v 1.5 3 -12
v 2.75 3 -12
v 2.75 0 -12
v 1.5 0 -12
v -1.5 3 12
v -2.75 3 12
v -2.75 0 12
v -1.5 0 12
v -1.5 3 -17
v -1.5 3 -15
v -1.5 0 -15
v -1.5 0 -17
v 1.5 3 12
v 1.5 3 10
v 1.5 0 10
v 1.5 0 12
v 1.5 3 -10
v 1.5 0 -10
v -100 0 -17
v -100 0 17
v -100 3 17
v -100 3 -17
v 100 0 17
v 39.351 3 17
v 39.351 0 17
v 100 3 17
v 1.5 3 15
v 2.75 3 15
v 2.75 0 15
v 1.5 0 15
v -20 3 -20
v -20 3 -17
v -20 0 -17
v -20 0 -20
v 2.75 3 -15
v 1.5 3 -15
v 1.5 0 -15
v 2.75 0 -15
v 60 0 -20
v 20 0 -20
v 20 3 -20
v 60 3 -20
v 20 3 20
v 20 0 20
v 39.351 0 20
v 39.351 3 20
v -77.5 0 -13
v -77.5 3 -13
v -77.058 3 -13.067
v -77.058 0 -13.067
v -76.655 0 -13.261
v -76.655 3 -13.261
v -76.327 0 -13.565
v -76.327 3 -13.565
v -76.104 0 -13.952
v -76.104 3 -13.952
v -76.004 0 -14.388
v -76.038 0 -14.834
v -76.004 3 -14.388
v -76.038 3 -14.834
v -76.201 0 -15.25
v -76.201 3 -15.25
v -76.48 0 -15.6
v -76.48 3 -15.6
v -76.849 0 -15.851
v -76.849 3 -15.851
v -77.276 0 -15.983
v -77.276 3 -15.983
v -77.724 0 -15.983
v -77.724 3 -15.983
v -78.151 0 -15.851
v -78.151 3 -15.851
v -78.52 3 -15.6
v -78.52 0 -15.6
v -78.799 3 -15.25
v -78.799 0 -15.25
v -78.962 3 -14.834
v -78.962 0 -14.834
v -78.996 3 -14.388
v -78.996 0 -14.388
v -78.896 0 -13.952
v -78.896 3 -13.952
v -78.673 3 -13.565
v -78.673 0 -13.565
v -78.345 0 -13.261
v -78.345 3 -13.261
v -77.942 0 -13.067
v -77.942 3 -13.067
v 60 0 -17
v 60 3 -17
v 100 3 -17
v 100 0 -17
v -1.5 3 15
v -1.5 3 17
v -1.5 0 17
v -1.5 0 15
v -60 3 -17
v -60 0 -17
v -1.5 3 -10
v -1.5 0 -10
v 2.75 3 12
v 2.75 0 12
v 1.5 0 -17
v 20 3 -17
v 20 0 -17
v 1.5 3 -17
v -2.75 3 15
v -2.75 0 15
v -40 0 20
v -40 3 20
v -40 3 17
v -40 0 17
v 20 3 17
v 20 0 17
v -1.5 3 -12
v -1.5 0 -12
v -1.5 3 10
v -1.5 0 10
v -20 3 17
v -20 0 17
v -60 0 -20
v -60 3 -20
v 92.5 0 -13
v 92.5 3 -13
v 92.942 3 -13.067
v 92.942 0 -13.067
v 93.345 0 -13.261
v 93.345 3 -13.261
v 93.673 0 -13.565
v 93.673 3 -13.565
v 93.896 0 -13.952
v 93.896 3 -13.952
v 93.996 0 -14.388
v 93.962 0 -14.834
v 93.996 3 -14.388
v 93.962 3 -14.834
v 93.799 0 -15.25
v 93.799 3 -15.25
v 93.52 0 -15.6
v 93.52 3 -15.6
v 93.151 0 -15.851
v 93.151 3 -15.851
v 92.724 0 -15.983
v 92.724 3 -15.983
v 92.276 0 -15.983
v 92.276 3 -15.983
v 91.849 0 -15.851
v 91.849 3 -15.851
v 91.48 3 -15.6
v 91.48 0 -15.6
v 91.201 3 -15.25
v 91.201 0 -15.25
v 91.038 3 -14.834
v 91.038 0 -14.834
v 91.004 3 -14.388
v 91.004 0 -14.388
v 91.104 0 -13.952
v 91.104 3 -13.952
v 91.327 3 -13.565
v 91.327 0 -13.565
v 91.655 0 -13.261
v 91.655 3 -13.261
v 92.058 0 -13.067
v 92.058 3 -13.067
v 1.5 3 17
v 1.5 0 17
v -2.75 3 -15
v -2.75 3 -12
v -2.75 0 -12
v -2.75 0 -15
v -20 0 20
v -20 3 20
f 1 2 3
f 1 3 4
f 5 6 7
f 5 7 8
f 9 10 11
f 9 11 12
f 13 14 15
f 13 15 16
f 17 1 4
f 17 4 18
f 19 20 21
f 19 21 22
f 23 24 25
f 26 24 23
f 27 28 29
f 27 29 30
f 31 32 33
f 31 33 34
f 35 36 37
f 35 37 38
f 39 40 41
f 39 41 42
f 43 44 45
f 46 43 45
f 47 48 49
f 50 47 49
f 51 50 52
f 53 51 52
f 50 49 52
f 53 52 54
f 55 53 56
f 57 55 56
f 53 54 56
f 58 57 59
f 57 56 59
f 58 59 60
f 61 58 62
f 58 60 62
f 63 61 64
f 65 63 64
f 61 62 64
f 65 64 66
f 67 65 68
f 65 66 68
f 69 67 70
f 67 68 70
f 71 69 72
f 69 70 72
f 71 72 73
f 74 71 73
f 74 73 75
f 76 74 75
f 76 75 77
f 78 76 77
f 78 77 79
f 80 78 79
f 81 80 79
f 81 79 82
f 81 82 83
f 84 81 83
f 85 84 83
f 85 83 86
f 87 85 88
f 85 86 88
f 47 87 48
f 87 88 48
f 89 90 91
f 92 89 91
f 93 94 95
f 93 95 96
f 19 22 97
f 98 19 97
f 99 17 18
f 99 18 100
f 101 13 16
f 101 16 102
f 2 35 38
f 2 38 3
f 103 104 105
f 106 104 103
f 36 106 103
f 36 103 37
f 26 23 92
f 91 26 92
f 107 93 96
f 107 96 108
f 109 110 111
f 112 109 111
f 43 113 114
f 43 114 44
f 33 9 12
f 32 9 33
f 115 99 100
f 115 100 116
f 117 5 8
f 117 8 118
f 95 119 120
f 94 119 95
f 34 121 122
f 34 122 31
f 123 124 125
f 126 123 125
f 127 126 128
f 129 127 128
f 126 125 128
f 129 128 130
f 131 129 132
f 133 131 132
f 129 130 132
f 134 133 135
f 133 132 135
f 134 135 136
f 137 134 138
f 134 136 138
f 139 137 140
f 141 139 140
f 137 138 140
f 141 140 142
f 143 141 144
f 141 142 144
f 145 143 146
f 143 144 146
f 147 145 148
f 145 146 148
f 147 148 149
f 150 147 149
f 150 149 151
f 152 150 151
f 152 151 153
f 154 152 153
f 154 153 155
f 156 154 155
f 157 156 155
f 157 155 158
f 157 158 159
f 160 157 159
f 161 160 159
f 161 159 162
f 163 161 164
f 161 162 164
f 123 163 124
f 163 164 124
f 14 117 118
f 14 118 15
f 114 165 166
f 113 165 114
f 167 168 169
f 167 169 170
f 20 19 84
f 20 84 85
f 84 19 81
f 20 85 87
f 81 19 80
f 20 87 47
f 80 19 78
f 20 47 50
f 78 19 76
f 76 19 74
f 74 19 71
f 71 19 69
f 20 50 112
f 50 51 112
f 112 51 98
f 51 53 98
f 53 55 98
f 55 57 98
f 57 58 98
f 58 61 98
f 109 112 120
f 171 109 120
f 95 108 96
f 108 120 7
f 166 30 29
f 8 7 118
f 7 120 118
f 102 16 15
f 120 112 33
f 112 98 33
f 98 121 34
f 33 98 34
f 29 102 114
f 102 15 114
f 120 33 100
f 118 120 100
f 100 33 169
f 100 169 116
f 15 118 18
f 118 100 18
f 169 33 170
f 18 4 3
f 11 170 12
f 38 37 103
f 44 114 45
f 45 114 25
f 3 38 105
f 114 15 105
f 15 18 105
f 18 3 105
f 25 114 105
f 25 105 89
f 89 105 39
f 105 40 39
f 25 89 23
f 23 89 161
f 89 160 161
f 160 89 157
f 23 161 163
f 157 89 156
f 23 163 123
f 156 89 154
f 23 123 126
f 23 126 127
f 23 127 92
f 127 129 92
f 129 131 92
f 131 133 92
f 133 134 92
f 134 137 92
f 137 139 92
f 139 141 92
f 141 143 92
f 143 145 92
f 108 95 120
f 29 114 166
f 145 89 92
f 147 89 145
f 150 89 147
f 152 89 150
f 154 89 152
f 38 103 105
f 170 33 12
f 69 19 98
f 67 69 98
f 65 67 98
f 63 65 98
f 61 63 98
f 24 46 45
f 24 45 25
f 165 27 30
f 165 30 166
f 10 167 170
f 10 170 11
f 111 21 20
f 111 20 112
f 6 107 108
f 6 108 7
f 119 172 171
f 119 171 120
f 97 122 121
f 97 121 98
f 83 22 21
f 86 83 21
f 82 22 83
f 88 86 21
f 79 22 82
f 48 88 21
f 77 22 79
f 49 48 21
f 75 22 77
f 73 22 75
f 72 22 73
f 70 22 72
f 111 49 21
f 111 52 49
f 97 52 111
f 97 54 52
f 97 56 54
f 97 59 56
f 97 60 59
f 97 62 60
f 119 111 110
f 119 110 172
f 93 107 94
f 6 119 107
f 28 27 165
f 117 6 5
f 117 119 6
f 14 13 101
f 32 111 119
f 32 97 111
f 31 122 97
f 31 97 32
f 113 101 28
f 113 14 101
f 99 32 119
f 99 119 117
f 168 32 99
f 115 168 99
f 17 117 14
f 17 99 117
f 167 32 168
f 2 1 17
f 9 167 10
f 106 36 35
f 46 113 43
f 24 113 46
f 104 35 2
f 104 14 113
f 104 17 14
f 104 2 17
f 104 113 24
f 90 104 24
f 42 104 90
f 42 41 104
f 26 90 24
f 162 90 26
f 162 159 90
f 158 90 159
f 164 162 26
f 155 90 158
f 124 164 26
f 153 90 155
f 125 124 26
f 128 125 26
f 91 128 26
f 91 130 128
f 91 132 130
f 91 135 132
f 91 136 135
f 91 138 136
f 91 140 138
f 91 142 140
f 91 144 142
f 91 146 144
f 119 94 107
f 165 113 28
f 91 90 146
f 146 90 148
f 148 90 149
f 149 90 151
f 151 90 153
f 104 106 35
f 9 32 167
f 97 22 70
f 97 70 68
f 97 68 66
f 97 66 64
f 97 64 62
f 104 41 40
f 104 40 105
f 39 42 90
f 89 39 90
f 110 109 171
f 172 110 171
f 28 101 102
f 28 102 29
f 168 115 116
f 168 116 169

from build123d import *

# Parameters (mm, degrees)
SKETCH1_W           = 200
SKETCH1_H           = 40
BOSS_EXTRUDE1_DEPTH = 3
SKETCH3_W           = 60
SKETCH3_H           = 3
SKETCH3_W_2         = 60.649381746
CUT_EXTRUDE1_DEPTH  = 3
SKETCH4_R           = 1.5
CUT_EXTRUDE2_DEPTH  = 3


with BuildPart() as part:
    # Sketch1 → Boss-Extrude1 (new body)
    with BuildSketch(Plane(origin=(0, 0, 0), x_dir=(1, 0, 0), z_dir=(0, 1, 0))):
        Rectangle(SKETCH1_W, SKETCH1_H)
    extrude(amount=BOSS_EXTRUDE1_DEPTH)

    # Sketch3 → Cut-Extrude1 (cut)
    with BuildSketch(Plane(origin=(0, 3, 0), x_dir=(1, 0, 0), z_dir=(0, 1, 0))):
        Polygon((-20, -20), (-20, -17), (-1.5, -17), (-1.5, -15), (-2.75, -15), (-2.75, -12), (-1.5, -12), (-1.5, -10), (1.5, -10), (1.5, -12), (2.75, -12), (2.75, -15), (1.5, -15), (1.5, -17), (20, -17), (20, -20), align=None)
        with Locations((-70, -18.5)):
            Rectangle(SKETCH3_W, SKETCH3_H)
        with Locations((69.675309127, -18.5)):
            Rectangle(SKETCH3_W_2, SKETCH3_H)
        Polygon((85, 17), (100, 17), (100, 20), (60, 20), (60, 17), (82, 17), align=None)
        Polygon((20, 20), (20, 17), (1.5, 17), (1.5, 15), (2.75, 15), (2.75, 12), (1.5, 12), (1.5, 10), (-1.5, 10), (-1.5, 12), (-2.75, 12), (-2.75, 15), (-1.5, 15), (-1.5, 17), (-20, 17), (-20, 20), align=None)
        Polygon((-60, 20), (-60, 17), (-82, 17), (-85, 17), (-100, 17), (-100, 20), align=None)
    extrude(amount=-CUT_EXTRUDE1_DEPTH, mode=Mode.SUBTRACT)

    # Sketch4 → Cut-Extrude2 (cut)
    with BuildSketch(Plane(origin=(0, 3, 0), x_dir=(1, 0, 0), z_dir=(0, 1, 0))):
        with Locations(Location((92.5, 14.5, 0), (0, 0, 270))):
            Circle(SKETCH4_R)
        with Locations(Location((-77.5, 14.5, 0), (0, 0, 270))):
            Circle(SKETCH4_R)
    extrude(amount=-CUT_EXTRUDE2_DEPTH, mode=Mode.SUBTRACT)


solid = part.part
